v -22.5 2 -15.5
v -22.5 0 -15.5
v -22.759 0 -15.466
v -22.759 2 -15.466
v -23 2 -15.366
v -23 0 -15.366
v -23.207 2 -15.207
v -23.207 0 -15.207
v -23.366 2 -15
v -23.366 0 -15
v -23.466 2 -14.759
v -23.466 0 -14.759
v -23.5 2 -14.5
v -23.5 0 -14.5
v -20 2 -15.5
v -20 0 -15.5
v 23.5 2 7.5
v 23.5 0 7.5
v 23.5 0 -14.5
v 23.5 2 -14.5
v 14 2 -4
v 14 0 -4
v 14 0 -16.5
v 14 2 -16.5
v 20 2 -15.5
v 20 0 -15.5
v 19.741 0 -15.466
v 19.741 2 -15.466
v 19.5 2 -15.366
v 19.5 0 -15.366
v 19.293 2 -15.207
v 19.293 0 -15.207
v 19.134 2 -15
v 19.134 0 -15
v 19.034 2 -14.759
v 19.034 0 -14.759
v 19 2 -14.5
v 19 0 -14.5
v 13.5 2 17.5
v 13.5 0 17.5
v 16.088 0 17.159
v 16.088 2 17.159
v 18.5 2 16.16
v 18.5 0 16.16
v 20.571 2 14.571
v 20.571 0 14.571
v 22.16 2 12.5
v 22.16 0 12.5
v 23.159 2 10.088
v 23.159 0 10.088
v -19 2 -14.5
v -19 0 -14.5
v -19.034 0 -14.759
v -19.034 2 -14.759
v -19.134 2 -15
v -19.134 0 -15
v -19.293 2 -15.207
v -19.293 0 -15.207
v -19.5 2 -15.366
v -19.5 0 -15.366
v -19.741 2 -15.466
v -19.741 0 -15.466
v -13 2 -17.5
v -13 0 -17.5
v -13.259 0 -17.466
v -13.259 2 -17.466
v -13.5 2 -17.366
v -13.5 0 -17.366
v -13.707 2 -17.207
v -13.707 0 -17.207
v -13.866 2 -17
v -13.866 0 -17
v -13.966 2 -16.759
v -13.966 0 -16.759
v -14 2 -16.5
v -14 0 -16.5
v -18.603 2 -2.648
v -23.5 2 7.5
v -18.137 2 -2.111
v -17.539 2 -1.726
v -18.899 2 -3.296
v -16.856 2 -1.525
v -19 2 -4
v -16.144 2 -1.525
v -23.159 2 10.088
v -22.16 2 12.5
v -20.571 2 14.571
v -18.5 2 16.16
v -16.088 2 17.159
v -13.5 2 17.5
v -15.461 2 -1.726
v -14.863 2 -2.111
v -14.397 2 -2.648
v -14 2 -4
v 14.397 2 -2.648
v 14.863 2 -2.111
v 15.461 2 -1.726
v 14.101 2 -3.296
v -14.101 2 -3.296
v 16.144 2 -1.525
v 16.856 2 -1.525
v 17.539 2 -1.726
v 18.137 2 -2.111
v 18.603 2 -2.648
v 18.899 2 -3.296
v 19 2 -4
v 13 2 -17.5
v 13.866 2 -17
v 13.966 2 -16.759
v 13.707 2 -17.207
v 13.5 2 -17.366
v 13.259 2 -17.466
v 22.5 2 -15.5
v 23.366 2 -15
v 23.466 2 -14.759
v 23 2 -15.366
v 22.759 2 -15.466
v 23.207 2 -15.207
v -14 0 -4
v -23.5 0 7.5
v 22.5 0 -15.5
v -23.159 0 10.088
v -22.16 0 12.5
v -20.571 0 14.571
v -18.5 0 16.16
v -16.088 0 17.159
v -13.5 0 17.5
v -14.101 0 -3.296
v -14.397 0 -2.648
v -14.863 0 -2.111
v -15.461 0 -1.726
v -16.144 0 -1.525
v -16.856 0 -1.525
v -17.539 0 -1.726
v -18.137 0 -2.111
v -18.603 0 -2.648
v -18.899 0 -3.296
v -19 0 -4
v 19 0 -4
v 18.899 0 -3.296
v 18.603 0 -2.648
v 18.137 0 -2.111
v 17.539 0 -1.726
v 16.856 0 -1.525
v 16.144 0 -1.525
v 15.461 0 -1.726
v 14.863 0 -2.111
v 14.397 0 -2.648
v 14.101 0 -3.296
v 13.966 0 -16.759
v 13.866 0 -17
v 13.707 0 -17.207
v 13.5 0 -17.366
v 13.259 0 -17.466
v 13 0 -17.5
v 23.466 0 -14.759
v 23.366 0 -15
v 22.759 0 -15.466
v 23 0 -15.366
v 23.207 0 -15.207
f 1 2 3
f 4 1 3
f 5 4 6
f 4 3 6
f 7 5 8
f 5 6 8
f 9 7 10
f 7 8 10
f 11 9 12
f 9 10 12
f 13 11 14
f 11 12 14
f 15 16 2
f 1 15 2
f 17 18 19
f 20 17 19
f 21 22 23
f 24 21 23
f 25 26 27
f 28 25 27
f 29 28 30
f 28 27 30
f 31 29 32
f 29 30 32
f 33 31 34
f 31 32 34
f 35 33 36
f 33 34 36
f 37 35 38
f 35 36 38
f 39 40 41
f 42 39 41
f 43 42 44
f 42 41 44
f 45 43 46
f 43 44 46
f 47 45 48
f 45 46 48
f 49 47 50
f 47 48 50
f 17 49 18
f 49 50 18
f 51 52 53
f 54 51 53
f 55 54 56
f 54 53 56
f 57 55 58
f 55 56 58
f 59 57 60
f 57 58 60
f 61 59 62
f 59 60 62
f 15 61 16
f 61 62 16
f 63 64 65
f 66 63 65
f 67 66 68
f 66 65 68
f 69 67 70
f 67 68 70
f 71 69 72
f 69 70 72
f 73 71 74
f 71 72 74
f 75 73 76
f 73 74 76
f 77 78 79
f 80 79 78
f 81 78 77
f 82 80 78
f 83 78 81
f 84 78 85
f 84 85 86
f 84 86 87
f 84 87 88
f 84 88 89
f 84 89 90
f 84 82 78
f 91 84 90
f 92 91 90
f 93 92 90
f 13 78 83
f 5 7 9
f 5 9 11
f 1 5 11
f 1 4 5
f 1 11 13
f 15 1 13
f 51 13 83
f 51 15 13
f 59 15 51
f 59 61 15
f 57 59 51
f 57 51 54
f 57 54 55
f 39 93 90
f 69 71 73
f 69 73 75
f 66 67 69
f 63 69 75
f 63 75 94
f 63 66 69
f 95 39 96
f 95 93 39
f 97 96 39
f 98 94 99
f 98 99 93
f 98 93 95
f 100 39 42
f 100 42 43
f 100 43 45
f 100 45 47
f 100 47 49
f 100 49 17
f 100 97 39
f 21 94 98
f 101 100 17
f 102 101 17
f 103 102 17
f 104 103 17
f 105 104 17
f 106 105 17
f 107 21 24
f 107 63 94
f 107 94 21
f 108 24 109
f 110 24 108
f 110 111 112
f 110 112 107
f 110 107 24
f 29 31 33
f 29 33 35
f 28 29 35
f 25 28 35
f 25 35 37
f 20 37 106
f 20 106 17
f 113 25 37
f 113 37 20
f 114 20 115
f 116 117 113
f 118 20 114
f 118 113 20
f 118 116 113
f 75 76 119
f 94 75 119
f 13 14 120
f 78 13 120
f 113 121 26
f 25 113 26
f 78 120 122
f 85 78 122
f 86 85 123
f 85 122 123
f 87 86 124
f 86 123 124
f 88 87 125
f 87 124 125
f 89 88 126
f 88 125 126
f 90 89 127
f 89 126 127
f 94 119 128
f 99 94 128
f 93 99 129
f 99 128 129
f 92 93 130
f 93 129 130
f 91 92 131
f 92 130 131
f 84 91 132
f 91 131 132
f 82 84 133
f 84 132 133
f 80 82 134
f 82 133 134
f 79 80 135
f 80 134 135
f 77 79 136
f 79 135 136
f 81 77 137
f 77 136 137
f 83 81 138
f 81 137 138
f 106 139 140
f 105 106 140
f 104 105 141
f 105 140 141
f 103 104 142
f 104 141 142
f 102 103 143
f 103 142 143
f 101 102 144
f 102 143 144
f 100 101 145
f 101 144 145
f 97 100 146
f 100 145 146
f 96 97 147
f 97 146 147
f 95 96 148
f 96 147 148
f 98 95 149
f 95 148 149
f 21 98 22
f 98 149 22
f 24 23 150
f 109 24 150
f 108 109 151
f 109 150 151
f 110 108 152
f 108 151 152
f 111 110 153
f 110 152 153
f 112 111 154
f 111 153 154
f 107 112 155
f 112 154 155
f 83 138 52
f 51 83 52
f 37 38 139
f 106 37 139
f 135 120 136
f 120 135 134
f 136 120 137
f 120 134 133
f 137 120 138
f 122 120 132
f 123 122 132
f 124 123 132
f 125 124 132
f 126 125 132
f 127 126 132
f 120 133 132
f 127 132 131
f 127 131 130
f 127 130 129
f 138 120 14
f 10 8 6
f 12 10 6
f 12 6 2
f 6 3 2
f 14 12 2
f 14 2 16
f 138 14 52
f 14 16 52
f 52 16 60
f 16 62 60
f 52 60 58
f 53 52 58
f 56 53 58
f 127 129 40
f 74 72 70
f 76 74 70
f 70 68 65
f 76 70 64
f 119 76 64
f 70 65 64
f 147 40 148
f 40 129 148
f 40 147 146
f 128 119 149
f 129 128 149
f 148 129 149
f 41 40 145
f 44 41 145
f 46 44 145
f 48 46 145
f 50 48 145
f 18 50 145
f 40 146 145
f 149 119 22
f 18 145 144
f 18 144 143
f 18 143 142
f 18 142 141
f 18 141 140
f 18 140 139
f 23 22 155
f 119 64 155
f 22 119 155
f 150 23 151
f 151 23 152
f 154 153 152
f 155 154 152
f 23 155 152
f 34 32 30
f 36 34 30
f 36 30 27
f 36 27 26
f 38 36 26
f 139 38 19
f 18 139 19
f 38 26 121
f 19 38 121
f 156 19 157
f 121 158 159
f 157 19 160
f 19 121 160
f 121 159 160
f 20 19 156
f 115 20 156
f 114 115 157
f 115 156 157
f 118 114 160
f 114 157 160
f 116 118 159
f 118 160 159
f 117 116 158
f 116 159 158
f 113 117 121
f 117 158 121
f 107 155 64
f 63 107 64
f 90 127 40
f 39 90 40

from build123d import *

# Parameters (mm, degrees)
RESSALTO_EXTRUS_O1_DEPTH = 2


with BuildPart() as part:
    # Esboço1 → Ressalto-extrusão1 (new body)
    with BuildSketch(Plane(origin=(0, 0, 0), x_dir=(1, 0, 0), z_dir=(0, 1, 0))):
        with BuildLine():
            Line((-23.5, 14.5), (-23.5, -7.5))
            ThreePointArc((-23.5, -7.5), (-20.571067812, -14.571067812), (-13.5, -17.5))
            Line((-13.5, -17.5), (13.5, -17.5))
            ThreePointArc((13.5, -17.5), (20.571067812, -14.571067812), (23.5, -7.5))
            Line((23.5, -7.5), (23.5, 14.5))
            ThreePointArc((23.5, 14.5), (23.207106781, 15.207106781), (22.5, 15.5))
            Line((22.5, 15.5), (20, 15.5))
            ThreePointArc((20, 15.5), (19.292893219, 15.207106781), (19, 14.5))
            Line((19, 14.5), (19, 4))
            ThreePointArc((19, 4), (16.5, 1.5), (14, 4))
            Line((14, 4), (14, 16.5))
            ThreePointArc((14, 16.5), (13.707106781, 17.207106781), (13, 17.5))
            Line((13, 17.5), (-13, 17.5))
            ThreePointArc((-13, 17.5), (-13.707106781, 17.207106781), (-14, 16.5))
            Line((-14, 16.5), (-14, 4))
            ThreePointArc((-14, 4), (-16.5, 1.5), (-19, 4))
            Line((-19, 4), (-19, 14.5))
            ThreePointArc((-19, 14.5), (-19.292893219, 15.207106781), (-20, 15.5))
            Line((-20, 15.5), (-22.5, 15.5))
            ThreePointArc((-22.5, 15.5), (-23.207106781, 15.207106781), (-23.5, 14.5))
        make_face()
    extrude(amount=RESSALTO_EXTRUS_O1_DEPTH)


solid = part.part
